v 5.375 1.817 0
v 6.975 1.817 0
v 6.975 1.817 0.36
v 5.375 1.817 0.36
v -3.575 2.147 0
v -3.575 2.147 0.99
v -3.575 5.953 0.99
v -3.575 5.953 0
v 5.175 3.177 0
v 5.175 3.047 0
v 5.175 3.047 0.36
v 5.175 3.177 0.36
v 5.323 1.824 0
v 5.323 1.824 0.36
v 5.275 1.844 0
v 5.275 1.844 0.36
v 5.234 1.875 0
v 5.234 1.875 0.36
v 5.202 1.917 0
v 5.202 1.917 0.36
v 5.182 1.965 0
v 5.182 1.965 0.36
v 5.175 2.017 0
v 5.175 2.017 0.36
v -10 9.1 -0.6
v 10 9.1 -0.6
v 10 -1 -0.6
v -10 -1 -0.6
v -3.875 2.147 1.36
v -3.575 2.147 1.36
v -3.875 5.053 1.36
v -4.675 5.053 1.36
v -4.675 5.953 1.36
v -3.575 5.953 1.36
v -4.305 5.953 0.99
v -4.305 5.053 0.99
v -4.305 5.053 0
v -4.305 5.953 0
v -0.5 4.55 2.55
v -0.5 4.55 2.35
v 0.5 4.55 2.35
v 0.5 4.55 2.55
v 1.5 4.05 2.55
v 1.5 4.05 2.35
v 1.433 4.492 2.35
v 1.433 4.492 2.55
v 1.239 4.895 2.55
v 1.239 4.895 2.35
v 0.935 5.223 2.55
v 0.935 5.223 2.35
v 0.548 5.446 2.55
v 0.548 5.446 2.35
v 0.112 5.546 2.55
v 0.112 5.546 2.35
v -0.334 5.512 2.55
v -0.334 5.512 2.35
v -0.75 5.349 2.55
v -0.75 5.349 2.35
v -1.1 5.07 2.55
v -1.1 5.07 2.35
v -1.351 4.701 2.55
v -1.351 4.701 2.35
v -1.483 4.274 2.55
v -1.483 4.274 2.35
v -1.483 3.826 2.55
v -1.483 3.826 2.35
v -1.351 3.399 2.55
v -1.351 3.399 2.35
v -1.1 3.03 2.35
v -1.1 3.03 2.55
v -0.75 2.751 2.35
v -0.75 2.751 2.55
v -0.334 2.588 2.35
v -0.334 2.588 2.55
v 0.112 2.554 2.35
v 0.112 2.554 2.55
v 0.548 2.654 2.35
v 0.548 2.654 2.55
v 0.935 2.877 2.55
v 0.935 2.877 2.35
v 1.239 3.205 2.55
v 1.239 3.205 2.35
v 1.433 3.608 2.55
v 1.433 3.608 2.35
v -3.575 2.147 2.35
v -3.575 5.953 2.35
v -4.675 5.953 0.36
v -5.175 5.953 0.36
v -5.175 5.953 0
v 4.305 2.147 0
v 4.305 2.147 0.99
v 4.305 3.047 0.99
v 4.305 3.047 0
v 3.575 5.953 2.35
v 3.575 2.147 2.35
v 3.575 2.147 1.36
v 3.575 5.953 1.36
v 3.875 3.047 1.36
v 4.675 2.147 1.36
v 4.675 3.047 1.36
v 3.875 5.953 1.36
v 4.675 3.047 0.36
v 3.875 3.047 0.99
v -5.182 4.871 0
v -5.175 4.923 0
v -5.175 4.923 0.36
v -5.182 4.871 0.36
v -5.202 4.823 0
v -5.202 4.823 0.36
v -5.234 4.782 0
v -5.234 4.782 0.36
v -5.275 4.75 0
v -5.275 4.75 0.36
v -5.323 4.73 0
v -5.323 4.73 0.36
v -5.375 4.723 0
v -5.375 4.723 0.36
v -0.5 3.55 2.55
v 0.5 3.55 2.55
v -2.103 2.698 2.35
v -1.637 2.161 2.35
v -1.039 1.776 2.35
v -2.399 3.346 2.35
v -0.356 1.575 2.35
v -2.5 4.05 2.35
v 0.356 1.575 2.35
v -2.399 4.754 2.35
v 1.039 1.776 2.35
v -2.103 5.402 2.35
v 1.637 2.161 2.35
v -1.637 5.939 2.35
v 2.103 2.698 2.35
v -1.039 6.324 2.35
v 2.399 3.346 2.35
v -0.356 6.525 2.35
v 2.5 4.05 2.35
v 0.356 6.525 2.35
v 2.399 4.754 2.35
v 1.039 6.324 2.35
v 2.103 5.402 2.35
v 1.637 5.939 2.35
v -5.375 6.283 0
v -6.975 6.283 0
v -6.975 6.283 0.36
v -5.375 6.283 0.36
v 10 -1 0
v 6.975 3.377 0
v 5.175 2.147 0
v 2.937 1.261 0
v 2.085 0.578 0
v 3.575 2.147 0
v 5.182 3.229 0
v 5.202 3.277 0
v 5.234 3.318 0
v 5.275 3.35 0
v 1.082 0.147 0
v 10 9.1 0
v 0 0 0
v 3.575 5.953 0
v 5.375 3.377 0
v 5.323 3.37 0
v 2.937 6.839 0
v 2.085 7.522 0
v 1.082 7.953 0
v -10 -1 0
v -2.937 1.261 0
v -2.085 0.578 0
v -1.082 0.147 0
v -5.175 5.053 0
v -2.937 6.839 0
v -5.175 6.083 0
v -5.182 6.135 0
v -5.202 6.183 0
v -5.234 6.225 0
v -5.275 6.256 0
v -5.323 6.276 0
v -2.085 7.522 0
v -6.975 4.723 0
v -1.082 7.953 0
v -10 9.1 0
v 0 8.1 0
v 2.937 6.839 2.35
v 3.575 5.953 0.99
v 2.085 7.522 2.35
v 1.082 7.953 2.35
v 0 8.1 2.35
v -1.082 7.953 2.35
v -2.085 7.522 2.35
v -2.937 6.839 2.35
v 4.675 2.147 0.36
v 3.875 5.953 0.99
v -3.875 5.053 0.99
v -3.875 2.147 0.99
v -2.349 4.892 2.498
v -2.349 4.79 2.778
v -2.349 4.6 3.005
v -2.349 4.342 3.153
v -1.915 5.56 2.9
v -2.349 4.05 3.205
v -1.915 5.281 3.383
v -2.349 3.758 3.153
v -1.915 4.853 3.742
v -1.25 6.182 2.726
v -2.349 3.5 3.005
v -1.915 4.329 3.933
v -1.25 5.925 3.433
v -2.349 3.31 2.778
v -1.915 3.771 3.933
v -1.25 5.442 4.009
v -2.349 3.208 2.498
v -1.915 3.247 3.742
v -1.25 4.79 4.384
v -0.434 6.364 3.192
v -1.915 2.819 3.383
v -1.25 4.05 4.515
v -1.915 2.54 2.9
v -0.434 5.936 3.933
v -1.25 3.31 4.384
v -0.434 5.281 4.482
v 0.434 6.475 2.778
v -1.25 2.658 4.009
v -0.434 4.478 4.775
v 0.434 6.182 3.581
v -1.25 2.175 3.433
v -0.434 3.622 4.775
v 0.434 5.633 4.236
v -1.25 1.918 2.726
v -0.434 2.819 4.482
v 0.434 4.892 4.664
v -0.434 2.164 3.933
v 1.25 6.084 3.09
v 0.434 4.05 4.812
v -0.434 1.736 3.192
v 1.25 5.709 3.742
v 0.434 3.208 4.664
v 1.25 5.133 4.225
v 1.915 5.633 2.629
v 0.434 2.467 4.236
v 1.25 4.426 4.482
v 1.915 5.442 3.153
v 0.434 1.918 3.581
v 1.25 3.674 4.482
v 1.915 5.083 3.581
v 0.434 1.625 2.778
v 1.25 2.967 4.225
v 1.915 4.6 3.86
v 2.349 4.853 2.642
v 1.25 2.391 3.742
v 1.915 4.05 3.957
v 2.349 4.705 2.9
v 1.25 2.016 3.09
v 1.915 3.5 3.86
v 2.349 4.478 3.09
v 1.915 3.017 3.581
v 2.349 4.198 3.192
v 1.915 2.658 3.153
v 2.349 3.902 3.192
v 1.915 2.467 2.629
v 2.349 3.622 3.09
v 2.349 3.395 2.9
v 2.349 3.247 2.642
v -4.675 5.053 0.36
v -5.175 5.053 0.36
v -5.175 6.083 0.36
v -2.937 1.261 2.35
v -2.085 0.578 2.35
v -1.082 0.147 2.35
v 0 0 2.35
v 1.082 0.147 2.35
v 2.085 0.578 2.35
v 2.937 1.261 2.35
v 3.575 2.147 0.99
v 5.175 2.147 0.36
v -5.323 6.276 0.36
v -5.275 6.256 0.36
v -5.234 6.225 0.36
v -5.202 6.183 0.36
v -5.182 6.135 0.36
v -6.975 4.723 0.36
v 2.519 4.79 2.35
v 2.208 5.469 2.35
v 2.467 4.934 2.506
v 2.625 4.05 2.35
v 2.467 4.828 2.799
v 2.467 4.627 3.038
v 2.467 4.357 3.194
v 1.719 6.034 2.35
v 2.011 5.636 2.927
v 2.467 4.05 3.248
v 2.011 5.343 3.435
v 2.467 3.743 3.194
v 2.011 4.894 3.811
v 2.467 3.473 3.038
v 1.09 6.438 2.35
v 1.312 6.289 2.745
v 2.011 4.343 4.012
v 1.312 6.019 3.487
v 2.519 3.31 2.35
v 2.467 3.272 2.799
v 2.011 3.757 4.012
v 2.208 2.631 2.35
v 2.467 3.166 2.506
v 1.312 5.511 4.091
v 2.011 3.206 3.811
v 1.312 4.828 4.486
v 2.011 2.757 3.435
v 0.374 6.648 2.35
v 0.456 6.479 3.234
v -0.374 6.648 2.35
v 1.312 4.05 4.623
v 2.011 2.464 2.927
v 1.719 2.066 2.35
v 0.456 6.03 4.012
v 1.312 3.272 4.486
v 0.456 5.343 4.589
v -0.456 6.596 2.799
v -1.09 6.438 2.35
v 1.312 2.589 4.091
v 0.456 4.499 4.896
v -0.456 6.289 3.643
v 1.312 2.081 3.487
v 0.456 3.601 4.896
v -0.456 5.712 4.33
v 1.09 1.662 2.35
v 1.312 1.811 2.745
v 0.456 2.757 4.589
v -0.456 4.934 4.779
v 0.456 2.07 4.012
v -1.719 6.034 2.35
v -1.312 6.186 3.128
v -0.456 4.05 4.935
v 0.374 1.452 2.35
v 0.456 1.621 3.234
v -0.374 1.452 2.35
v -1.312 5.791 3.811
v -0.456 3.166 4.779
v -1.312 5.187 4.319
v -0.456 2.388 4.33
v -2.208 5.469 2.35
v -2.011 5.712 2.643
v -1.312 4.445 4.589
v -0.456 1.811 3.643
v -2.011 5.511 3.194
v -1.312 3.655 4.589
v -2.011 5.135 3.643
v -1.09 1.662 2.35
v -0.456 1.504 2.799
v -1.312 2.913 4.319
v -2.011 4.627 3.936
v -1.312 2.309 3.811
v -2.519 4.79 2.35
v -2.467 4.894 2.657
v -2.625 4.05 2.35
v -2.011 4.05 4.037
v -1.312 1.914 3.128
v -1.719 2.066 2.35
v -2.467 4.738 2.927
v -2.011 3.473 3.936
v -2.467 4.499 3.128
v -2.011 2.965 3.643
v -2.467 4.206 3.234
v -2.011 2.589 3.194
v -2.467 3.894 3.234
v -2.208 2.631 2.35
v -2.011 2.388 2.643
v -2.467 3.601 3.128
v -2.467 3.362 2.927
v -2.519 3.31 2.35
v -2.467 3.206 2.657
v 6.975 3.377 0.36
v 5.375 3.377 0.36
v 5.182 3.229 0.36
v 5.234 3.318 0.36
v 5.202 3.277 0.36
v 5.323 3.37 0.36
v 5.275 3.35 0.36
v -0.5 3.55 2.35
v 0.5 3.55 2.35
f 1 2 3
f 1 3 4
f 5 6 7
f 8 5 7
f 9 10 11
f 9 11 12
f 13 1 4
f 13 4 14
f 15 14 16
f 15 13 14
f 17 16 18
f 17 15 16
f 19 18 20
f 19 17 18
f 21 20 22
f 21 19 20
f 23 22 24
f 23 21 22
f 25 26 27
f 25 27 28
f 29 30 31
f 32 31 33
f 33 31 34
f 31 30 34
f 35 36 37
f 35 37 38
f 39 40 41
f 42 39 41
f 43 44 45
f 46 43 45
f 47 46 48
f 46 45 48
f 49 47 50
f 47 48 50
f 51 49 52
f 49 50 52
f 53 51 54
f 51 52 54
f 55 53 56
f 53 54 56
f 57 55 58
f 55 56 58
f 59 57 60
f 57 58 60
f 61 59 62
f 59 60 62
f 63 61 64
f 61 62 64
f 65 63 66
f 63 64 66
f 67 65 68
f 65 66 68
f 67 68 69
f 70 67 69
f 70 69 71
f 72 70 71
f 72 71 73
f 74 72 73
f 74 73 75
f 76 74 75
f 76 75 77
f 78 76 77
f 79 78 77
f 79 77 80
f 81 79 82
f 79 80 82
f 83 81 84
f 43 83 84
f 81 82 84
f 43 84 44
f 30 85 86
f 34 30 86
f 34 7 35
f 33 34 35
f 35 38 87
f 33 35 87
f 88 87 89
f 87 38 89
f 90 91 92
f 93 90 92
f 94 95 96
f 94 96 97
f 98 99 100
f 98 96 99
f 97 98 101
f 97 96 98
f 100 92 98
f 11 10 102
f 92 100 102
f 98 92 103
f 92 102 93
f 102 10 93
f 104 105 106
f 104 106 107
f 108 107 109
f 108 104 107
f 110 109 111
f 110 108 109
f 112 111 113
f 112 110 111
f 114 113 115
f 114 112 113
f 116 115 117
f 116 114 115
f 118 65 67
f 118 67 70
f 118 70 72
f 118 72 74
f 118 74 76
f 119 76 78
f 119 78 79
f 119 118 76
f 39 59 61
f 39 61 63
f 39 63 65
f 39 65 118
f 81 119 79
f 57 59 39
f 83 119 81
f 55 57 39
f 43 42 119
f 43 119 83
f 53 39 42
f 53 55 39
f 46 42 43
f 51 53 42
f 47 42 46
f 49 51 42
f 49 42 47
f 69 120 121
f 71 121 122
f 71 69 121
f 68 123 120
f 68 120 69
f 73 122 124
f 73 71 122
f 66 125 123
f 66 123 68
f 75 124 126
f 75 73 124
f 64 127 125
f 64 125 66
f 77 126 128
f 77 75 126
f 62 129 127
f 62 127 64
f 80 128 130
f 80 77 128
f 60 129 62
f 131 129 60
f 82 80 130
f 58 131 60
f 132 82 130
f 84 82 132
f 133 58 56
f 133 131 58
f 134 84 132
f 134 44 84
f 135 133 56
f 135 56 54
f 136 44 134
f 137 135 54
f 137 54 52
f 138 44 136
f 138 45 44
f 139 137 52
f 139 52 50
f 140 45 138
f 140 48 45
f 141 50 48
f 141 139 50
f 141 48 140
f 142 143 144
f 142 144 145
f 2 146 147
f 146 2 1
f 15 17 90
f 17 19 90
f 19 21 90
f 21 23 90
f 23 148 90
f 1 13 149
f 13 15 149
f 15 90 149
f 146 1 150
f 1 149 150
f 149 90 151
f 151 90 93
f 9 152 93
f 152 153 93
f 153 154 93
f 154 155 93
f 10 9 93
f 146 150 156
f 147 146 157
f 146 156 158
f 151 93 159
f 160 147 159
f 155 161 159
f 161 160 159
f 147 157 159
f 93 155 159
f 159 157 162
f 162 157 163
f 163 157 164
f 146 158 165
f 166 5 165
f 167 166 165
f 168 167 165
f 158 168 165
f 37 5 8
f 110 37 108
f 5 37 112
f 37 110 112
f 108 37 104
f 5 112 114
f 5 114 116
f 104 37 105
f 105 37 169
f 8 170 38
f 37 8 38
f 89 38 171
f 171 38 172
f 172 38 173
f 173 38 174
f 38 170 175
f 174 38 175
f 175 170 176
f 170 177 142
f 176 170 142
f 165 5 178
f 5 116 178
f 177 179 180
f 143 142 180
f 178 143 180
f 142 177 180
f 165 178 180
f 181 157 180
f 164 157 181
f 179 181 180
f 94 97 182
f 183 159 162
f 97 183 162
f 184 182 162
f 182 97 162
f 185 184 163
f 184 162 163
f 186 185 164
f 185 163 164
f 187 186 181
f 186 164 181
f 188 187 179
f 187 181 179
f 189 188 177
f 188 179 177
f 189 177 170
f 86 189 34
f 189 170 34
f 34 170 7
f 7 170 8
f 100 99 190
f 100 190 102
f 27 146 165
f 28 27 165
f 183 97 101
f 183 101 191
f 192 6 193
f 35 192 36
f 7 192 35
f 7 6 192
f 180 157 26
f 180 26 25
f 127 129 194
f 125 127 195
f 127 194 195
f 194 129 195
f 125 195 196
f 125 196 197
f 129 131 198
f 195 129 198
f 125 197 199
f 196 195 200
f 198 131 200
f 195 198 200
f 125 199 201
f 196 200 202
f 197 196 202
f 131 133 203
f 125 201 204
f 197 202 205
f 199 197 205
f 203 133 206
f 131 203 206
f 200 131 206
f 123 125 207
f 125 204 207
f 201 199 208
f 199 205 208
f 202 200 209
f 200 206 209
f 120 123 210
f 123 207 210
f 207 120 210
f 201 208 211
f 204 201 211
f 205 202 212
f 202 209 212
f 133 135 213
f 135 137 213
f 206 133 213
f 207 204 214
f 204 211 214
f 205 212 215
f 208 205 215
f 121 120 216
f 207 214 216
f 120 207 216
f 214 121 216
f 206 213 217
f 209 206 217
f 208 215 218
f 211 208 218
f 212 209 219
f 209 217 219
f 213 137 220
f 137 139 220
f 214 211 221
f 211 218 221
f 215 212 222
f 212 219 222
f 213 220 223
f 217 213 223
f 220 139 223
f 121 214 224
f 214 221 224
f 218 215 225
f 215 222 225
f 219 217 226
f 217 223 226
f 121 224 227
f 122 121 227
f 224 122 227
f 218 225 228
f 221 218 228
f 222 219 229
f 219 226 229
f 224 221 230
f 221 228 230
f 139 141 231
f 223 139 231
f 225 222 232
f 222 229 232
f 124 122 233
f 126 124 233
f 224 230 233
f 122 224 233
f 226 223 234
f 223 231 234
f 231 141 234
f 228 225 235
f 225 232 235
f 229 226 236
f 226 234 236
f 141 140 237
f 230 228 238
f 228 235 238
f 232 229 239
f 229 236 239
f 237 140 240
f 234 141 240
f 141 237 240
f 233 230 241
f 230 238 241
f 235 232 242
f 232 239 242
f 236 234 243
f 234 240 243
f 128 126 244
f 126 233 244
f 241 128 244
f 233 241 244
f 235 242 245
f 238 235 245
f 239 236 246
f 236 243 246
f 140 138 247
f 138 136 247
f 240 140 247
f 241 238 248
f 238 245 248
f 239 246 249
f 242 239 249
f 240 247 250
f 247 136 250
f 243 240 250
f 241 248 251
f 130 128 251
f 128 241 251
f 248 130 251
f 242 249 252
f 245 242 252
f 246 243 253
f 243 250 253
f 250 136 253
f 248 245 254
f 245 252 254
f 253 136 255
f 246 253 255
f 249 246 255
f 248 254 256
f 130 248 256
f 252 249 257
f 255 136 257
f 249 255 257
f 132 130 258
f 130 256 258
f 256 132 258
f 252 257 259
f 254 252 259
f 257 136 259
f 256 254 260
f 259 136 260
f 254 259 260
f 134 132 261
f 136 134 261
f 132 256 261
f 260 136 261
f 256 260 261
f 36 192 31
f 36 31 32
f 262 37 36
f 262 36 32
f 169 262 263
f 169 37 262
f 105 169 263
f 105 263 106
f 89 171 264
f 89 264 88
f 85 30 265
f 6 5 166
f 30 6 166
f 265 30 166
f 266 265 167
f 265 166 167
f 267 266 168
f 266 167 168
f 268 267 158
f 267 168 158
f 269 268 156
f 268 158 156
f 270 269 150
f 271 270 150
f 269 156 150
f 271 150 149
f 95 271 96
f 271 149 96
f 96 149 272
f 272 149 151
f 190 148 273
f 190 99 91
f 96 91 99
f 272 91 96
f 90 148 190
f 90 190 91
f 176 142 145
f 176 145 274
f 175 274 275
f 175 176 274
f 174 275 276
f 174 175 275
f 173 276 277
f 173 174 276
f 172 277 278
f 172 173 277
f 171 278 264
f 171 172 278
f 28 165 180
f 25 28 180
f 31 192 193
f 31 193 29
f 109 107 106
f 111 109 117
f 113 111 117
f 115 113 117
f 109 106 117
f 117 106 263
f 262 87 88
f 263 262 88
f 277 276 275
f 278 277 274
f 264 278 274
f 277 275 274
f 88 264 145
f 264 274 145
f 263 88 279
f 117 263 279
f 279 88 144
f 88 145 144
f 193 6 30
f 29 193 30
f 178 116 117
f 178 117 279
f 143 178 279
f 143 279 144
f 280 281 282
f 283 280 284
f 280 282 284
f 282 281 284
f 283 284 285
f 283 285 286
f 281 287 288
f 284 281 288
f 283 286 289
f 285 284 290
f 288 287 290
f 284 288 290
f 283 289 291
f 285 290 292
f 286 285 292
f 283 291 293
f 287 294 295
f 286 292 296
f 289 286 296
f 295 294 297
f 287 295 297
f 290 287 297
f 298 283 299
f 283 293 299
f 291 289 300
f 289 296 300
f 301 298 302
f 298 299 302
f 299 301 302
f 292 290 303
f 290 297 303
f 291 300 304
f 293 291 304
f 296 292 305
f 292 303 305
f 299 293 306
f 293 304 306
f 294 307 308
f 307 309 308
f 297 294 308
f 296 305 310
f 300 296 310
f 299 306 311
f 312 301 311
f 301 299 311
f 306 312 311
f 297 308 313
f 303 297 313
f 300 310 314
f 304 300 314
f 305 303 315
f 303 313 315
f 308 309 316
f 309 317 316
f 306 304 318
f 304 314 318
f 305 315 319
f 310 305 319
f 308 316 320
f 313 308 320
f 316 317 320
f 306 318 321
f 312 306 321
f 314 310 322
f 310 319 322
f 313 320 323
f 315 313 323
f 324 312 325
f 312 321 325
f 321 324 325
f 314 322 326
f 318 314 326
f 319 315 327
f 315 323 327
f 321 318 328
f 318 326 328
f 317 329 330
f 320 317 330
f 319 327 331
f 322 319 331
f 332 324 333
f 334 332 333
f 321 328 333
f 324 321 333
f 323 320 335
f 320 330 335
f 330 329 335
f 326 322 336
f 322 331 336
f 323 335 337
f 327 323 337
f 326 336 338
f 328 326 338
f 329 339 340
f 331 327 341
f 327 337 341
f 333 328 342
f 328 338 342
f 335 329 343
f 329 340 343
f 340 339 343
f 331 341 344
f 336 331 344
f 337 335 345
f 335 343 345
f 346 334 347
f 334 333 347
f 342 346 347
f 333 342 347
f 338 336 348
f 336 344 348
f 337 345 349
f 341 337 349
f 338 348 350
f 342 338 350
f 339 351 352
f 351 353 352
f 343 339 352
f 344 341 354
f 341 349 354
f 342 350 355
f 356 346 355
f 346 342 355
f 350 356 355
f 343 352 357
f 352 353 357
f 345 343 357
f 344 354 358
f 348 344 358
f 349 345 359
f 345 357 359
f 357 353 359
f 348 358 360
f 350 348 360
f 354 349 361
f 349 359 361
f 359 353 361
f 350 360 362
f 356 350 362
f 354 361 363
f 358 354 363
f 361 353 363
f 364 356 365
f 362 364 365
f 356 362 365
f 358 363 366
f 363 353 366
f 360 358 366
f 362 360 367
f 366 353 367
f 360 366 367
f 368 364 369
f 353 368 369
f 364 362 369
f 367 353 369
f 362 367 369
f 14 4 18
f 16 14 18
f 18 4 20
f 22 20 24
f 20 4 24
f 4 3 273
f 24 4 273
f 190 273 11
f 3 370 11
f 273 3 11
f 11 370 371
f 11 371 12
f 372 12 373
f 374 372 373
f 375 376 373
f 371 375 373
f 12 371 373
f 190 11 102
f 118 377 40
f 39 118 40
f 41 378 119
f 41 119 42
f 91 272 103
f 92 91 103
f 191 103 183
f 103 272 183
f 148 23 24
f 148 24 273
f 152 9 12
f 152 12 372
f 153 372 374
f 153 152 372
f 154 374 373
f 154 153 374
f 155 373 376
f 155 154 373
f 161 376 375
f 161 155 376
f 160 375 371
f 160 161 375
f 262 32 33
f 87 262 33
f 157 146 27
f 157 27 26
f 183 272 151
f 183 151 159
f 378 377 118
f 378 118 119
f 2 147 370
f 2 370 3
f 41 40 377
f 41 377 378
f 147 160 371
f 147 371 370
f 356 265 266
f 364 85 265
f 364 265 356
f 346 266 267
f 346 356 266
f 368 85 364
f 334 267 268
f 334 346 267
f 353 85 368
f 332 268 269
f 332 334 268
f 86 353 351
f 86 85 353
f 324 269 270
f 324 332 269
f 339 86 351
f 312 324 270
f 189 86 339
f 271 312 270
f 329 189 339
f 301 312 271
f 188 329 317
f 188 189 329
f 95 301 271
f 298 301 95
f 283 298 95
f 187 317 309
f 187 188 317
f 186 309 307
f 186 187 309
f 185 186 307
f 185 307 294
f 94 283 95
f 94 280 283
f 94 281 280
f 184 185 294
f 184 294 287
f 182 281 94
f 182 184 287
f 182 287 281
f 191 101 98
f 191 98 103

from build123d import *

# Parameters (mm, degrees)
SKETCH1_R            = 4.05
BOSS_EXTRUDE1_DEPTH  = 2.35
SKETCH2_R            = 1.5
SKETCH2_W            = 1
SKETCH2_H            = 1
BOSS_EXTRUDE2_DEPTH  = 0.2
REVOLVE1_ANGLE       = 180
SKETCH4_W            = 0.475
SKETCH4_H            = 8.1
CUT_EXTRUDE1_DEPTH   = 10.428845369
SKETCH5_W            = 0.37
SKETCH5_H            = 3.806244868
BOSS_EXTRUDE3_DEPTH  = 0.3
SKETCH6_W            = 0.37
SKETCH6_H            = 0.9
BOSS_EXTRUDE4_DEPTH  = 0.8
SKETCH7_W            = 0.37
SKETCH7_H            = 0.9
BOSS_EXTRUDE5_DEPTH  = 1
SKETCH8_W            = 0.5
SKETCH8_H            = 0.9
BOSS_EXTRUDE6_DEPTH  = 0.37
SKETCH9_W            = 0.37
SKETCH9_H            = 3.806244868
BOSS_EXTRUDE7_DEPTH  = 0.3
SKETCH10_W           = 0.37
SKETCH10_H           = 0.9
BOSS_EXTRUDE8_DEPTH  = 0.8
SKETCH11_W           = 0.37
SKETCH11_H           = 0.9
BOSS_EXTRUDE9_DEPTH  = 1
SKETCH12_W           = 0.5
SKETCH12_H           = 0.9
BOSS_EXTRUDE10_DEPTH = 0.37
SKETCH13_R           = 2.75
BOSS_EXTRUDE11_DEPTH = 0.1
SKETCH14_W           = 20
SKETCH14_H           = 10.1
BOSS_EXTRUDE13_DEPTH = 0.6


with BuildPart() as part:
    # Sketch1 → Boss-Extrude1 (new body)
    with BuildSketch(Plane.XY):
        with Locations((0, 4.05)):
            Circle(SKETCH1_R)
    extrude(amount=BOSS_EXTRUDE1_DEPTH)

    # Sketch2 → Boss-Extrude2 (add)
    with BuildSketch(Plane.XY.offset(2.35)):
        with Locations((0, 4.05)):
            Circle(SKETCH2_R)
        with Locations((0, 4.05)):
            Rectangle(SKETCH2_W, SKETCH2_H, mode=Mode.SUBTRACT)
    extrude(amount=BOSS_EXTRUDE2_DEPTH)

    # Sketch3 → Revolve1 (revolve)
    with BuildSketch(Plane.XY.offset(2.35)):
        with BuildLine():
            Line((-2.625, 4.05), (-2.5, 4.05))
            ThreePointArc((-2.5, 4.05), (0, 6.55), (2.5, 4.05))
            Line((2.5, 4.05), (2.625, 4.05))
            ThreePointArc((2.625, 4.05), (0, 6.675), (-2.625, 4.05))
        make_face()
    revolve(axis=Axis((0, 4.05, 2.35), (1, 0, 0)), revolution_arc=REVOLVE1_ANGLE)

    # Sketch4 → Cut-Extrude1 (cut, through all)
    with BuildSketch(Plane.XY.offset(2.35)):
        with Locations((-3.8125, 4.05)):
            Rectangle(SKETCH4_W, SKETCH4_H)
        with Locations((3.8125, 4.05)):
            Rectangle(SKETCH4_W, SKETCH4_H)
    extrude(amount=-CUT_EXTRUDE1_DEPTH, mode=Mode.SUBTRACT)

    # Sketch5 → Boss-Extrude3 (add)
    with BuildSketch(Plane.ZY.offset(3.575)):
        with Locations((1.175, 4.05)):
            Rectangle(SKETCH5_W, SKETCH5_H)
    extrude(amount=BOSS_EXTRUDE3_DEPTH)

    # Sketch6 → Boss-Extrude4 (add)
    with BuildSketch(Plane.ZY.offset(3.875)):
        with Locations((1.175, 5.503122434)):
            Rectangle(SKETCH6_W, SKETCH6_H)
    extrude(amount=BOSS_EXTRUDE4_DEPTH)

    # Sketch7 → Boss-Extrude5 (add)
    with BuildSketch(Plane(origin=(0, 0, 0.99), x_dir=(-1, 0, 0), z_dir=(0, 0, -1))):
        with Locations((4.49, 5.503122434)):
            Rectangle(SKETCH7_W, SKETCH7_H)
    extrude(amount=BOSS_EXTRUDE5_DEPTH)

    # Sketch8 → Boss-Extrude6 (add)
    with BuildSketch(Plane(origin=(0, 0, -0.01), x_dir=(-1, 0, 0), z_dir=(0, 0, -1))):
        with BuildLine():
            Line((5.175, 6.083122434), (5.175, 5.953122434))
            Line((5.175, 5.953122434), (5.175, 5.503122434))
            Line((5.175, 5.503122434), (6.975, 5.503122434))
            Line((6.975, 5.503122434), (6.975, 6.283122434))
            Line((6.975, 6.283122434), (5.375, 6.283122434))
            ThreePointArc((5.375, 6.283122434), (5.233578644, 6.224543791), (5.175, 6.083122434))
        make_face()
        with BuildLine():
            Line((6.975, 5.503122434), (5.175, 5.503122434))
            Line((5.175, 5.503122434), (5.175, 5.053122434))
            Line((5.175, 5.053122434), (5.175, 4.923122434))
            ThreePointArc((5.175, 4.923122434), (5.233578644, 4.781701078), (5.375, 4.723122434))
            Line((5.375, 4.723122434), (6.975, 4.723122434))
            Line((6.975, 4.723122434), (6.975, 5.503122434))
        make_face()
        with Locations((4.925, 5.503122434)):
            Rectangle(SKETCH8_W, SKETCH8_H)
    extrude(amount=-BOSS_EXTRUDE6_DEPTH)

    # Sketch9 → Boss-Extrude7 (add)
    with BuildSketch(Plane(origin=(3.575, 0, 0), x_dir=(0, 0, -1), z_dir=(1, 0, 0))):
        with Locations((-1.175, 4.05)):
            Rectangle(SKETCH9_W, SKETCH9_H)
    extrude(amount=BOSS_EXTRUDE7_DEPTH)

    # Sketch10 → Boss-Extrude8 (add)
    with BuildSketch(Plane(origin=(3.875, 0, 0), x_dir=(0, 0, -1), z_dir=(1, 0, 0))):
        with Locations((-1.175, 2.596877566)):
            Rectangle(SKETCH10_W, SKETCH10_H)
    extrude(amount=BOSS_EXTRUDE8_DEPTH)

    # Sketch11 → Boss-Extrude9 (add)
    with BuildSketch(Plane(origin=(0, 0, 0.99), x_dir=(-1, 0, 0), z_dir=(0, 0, -1))):
        with Locations((-4.49, 2.596877566)):
            Rectangle(SKETCH11_W, SKETCH11_H)
    extrude(amount=BOSS_EXTRUDE9_DEPTH)

    # Sketch12 → Boss-Extrude10 (add)
    with BuildSketch(Plane(origin=(0, 0, -0.01), x_dir=(-1, 0, 0), z_dir=(0, 0, -1))):
        with Locations((-4.925, 2.596877566)):
            Rectangle(SKETCH12_W, SKETCH12_H)
        with BuildLine():
            Line((-5.175, 2.016877566), (-5.175, 2.146877566))
            Line((-5.175, 2.146877566), (-5.175, 2.596877566))
            Line((-5.175, 2.596877566), (-6.975, 2.596877566))
            Line((-6.975, 2.596877566), (-6.975, 1.816877566))
            Line((-6.975, 1.816877566), (-5.375, 1.816877566))
            ThreePointArc((-5.375, 1.816877566), (-5.233578644, 1.875456209), (-5.175, 2.016877566))
        make_face()
        with BuildLine():
            Line((-6.975, 2.596877566), (-5.175, 2.596877566))
            Line((-5.175, 2.596877566), (-5.175, 3.046877566))
            Line((-5.175, 3.046877566), (-5.175, 3.176877566))
            ThreePointArc((-5.175, 3.176877566), (-5.233578644, 3.318298922), (-5.375, 3.376877566))
            Line((-5.375, 3.376877566), (-6.975, 3.376877566))
            Line((-6.975, 3.376877566), (-6.975, 2.596877566))
        make_face()
    extrude(amount=-BOSS_EXTRUDE10_DEPTH)

    # Sketch13 → Boss-Extrude11 (add)
    with BuildSketch(Plane(origin=(0, 0, 0), x_dir=(-1, 0, 0), z_dir=(0, 0, -1))):
        with Locations((0, 4.05)):
            Circle(SKETCH13_R)
    extrude(amount=BOSS_EXTRUDE11_DEPTH)

    # Sketch14 → Boss-Extrude13 (add)
    with BuildSketch(Plane(origin=(0, 0, 0), x_dir=(-1, 0, 0), z_dir=(0, 0, -1))):
        with Locations((0, 4.05)):
            Rectangle(SKETCH14_W, SKETCH14_H)
    extrude(amount=BOSS_EXTRUDE13_DEPTH)


solid = part.part
